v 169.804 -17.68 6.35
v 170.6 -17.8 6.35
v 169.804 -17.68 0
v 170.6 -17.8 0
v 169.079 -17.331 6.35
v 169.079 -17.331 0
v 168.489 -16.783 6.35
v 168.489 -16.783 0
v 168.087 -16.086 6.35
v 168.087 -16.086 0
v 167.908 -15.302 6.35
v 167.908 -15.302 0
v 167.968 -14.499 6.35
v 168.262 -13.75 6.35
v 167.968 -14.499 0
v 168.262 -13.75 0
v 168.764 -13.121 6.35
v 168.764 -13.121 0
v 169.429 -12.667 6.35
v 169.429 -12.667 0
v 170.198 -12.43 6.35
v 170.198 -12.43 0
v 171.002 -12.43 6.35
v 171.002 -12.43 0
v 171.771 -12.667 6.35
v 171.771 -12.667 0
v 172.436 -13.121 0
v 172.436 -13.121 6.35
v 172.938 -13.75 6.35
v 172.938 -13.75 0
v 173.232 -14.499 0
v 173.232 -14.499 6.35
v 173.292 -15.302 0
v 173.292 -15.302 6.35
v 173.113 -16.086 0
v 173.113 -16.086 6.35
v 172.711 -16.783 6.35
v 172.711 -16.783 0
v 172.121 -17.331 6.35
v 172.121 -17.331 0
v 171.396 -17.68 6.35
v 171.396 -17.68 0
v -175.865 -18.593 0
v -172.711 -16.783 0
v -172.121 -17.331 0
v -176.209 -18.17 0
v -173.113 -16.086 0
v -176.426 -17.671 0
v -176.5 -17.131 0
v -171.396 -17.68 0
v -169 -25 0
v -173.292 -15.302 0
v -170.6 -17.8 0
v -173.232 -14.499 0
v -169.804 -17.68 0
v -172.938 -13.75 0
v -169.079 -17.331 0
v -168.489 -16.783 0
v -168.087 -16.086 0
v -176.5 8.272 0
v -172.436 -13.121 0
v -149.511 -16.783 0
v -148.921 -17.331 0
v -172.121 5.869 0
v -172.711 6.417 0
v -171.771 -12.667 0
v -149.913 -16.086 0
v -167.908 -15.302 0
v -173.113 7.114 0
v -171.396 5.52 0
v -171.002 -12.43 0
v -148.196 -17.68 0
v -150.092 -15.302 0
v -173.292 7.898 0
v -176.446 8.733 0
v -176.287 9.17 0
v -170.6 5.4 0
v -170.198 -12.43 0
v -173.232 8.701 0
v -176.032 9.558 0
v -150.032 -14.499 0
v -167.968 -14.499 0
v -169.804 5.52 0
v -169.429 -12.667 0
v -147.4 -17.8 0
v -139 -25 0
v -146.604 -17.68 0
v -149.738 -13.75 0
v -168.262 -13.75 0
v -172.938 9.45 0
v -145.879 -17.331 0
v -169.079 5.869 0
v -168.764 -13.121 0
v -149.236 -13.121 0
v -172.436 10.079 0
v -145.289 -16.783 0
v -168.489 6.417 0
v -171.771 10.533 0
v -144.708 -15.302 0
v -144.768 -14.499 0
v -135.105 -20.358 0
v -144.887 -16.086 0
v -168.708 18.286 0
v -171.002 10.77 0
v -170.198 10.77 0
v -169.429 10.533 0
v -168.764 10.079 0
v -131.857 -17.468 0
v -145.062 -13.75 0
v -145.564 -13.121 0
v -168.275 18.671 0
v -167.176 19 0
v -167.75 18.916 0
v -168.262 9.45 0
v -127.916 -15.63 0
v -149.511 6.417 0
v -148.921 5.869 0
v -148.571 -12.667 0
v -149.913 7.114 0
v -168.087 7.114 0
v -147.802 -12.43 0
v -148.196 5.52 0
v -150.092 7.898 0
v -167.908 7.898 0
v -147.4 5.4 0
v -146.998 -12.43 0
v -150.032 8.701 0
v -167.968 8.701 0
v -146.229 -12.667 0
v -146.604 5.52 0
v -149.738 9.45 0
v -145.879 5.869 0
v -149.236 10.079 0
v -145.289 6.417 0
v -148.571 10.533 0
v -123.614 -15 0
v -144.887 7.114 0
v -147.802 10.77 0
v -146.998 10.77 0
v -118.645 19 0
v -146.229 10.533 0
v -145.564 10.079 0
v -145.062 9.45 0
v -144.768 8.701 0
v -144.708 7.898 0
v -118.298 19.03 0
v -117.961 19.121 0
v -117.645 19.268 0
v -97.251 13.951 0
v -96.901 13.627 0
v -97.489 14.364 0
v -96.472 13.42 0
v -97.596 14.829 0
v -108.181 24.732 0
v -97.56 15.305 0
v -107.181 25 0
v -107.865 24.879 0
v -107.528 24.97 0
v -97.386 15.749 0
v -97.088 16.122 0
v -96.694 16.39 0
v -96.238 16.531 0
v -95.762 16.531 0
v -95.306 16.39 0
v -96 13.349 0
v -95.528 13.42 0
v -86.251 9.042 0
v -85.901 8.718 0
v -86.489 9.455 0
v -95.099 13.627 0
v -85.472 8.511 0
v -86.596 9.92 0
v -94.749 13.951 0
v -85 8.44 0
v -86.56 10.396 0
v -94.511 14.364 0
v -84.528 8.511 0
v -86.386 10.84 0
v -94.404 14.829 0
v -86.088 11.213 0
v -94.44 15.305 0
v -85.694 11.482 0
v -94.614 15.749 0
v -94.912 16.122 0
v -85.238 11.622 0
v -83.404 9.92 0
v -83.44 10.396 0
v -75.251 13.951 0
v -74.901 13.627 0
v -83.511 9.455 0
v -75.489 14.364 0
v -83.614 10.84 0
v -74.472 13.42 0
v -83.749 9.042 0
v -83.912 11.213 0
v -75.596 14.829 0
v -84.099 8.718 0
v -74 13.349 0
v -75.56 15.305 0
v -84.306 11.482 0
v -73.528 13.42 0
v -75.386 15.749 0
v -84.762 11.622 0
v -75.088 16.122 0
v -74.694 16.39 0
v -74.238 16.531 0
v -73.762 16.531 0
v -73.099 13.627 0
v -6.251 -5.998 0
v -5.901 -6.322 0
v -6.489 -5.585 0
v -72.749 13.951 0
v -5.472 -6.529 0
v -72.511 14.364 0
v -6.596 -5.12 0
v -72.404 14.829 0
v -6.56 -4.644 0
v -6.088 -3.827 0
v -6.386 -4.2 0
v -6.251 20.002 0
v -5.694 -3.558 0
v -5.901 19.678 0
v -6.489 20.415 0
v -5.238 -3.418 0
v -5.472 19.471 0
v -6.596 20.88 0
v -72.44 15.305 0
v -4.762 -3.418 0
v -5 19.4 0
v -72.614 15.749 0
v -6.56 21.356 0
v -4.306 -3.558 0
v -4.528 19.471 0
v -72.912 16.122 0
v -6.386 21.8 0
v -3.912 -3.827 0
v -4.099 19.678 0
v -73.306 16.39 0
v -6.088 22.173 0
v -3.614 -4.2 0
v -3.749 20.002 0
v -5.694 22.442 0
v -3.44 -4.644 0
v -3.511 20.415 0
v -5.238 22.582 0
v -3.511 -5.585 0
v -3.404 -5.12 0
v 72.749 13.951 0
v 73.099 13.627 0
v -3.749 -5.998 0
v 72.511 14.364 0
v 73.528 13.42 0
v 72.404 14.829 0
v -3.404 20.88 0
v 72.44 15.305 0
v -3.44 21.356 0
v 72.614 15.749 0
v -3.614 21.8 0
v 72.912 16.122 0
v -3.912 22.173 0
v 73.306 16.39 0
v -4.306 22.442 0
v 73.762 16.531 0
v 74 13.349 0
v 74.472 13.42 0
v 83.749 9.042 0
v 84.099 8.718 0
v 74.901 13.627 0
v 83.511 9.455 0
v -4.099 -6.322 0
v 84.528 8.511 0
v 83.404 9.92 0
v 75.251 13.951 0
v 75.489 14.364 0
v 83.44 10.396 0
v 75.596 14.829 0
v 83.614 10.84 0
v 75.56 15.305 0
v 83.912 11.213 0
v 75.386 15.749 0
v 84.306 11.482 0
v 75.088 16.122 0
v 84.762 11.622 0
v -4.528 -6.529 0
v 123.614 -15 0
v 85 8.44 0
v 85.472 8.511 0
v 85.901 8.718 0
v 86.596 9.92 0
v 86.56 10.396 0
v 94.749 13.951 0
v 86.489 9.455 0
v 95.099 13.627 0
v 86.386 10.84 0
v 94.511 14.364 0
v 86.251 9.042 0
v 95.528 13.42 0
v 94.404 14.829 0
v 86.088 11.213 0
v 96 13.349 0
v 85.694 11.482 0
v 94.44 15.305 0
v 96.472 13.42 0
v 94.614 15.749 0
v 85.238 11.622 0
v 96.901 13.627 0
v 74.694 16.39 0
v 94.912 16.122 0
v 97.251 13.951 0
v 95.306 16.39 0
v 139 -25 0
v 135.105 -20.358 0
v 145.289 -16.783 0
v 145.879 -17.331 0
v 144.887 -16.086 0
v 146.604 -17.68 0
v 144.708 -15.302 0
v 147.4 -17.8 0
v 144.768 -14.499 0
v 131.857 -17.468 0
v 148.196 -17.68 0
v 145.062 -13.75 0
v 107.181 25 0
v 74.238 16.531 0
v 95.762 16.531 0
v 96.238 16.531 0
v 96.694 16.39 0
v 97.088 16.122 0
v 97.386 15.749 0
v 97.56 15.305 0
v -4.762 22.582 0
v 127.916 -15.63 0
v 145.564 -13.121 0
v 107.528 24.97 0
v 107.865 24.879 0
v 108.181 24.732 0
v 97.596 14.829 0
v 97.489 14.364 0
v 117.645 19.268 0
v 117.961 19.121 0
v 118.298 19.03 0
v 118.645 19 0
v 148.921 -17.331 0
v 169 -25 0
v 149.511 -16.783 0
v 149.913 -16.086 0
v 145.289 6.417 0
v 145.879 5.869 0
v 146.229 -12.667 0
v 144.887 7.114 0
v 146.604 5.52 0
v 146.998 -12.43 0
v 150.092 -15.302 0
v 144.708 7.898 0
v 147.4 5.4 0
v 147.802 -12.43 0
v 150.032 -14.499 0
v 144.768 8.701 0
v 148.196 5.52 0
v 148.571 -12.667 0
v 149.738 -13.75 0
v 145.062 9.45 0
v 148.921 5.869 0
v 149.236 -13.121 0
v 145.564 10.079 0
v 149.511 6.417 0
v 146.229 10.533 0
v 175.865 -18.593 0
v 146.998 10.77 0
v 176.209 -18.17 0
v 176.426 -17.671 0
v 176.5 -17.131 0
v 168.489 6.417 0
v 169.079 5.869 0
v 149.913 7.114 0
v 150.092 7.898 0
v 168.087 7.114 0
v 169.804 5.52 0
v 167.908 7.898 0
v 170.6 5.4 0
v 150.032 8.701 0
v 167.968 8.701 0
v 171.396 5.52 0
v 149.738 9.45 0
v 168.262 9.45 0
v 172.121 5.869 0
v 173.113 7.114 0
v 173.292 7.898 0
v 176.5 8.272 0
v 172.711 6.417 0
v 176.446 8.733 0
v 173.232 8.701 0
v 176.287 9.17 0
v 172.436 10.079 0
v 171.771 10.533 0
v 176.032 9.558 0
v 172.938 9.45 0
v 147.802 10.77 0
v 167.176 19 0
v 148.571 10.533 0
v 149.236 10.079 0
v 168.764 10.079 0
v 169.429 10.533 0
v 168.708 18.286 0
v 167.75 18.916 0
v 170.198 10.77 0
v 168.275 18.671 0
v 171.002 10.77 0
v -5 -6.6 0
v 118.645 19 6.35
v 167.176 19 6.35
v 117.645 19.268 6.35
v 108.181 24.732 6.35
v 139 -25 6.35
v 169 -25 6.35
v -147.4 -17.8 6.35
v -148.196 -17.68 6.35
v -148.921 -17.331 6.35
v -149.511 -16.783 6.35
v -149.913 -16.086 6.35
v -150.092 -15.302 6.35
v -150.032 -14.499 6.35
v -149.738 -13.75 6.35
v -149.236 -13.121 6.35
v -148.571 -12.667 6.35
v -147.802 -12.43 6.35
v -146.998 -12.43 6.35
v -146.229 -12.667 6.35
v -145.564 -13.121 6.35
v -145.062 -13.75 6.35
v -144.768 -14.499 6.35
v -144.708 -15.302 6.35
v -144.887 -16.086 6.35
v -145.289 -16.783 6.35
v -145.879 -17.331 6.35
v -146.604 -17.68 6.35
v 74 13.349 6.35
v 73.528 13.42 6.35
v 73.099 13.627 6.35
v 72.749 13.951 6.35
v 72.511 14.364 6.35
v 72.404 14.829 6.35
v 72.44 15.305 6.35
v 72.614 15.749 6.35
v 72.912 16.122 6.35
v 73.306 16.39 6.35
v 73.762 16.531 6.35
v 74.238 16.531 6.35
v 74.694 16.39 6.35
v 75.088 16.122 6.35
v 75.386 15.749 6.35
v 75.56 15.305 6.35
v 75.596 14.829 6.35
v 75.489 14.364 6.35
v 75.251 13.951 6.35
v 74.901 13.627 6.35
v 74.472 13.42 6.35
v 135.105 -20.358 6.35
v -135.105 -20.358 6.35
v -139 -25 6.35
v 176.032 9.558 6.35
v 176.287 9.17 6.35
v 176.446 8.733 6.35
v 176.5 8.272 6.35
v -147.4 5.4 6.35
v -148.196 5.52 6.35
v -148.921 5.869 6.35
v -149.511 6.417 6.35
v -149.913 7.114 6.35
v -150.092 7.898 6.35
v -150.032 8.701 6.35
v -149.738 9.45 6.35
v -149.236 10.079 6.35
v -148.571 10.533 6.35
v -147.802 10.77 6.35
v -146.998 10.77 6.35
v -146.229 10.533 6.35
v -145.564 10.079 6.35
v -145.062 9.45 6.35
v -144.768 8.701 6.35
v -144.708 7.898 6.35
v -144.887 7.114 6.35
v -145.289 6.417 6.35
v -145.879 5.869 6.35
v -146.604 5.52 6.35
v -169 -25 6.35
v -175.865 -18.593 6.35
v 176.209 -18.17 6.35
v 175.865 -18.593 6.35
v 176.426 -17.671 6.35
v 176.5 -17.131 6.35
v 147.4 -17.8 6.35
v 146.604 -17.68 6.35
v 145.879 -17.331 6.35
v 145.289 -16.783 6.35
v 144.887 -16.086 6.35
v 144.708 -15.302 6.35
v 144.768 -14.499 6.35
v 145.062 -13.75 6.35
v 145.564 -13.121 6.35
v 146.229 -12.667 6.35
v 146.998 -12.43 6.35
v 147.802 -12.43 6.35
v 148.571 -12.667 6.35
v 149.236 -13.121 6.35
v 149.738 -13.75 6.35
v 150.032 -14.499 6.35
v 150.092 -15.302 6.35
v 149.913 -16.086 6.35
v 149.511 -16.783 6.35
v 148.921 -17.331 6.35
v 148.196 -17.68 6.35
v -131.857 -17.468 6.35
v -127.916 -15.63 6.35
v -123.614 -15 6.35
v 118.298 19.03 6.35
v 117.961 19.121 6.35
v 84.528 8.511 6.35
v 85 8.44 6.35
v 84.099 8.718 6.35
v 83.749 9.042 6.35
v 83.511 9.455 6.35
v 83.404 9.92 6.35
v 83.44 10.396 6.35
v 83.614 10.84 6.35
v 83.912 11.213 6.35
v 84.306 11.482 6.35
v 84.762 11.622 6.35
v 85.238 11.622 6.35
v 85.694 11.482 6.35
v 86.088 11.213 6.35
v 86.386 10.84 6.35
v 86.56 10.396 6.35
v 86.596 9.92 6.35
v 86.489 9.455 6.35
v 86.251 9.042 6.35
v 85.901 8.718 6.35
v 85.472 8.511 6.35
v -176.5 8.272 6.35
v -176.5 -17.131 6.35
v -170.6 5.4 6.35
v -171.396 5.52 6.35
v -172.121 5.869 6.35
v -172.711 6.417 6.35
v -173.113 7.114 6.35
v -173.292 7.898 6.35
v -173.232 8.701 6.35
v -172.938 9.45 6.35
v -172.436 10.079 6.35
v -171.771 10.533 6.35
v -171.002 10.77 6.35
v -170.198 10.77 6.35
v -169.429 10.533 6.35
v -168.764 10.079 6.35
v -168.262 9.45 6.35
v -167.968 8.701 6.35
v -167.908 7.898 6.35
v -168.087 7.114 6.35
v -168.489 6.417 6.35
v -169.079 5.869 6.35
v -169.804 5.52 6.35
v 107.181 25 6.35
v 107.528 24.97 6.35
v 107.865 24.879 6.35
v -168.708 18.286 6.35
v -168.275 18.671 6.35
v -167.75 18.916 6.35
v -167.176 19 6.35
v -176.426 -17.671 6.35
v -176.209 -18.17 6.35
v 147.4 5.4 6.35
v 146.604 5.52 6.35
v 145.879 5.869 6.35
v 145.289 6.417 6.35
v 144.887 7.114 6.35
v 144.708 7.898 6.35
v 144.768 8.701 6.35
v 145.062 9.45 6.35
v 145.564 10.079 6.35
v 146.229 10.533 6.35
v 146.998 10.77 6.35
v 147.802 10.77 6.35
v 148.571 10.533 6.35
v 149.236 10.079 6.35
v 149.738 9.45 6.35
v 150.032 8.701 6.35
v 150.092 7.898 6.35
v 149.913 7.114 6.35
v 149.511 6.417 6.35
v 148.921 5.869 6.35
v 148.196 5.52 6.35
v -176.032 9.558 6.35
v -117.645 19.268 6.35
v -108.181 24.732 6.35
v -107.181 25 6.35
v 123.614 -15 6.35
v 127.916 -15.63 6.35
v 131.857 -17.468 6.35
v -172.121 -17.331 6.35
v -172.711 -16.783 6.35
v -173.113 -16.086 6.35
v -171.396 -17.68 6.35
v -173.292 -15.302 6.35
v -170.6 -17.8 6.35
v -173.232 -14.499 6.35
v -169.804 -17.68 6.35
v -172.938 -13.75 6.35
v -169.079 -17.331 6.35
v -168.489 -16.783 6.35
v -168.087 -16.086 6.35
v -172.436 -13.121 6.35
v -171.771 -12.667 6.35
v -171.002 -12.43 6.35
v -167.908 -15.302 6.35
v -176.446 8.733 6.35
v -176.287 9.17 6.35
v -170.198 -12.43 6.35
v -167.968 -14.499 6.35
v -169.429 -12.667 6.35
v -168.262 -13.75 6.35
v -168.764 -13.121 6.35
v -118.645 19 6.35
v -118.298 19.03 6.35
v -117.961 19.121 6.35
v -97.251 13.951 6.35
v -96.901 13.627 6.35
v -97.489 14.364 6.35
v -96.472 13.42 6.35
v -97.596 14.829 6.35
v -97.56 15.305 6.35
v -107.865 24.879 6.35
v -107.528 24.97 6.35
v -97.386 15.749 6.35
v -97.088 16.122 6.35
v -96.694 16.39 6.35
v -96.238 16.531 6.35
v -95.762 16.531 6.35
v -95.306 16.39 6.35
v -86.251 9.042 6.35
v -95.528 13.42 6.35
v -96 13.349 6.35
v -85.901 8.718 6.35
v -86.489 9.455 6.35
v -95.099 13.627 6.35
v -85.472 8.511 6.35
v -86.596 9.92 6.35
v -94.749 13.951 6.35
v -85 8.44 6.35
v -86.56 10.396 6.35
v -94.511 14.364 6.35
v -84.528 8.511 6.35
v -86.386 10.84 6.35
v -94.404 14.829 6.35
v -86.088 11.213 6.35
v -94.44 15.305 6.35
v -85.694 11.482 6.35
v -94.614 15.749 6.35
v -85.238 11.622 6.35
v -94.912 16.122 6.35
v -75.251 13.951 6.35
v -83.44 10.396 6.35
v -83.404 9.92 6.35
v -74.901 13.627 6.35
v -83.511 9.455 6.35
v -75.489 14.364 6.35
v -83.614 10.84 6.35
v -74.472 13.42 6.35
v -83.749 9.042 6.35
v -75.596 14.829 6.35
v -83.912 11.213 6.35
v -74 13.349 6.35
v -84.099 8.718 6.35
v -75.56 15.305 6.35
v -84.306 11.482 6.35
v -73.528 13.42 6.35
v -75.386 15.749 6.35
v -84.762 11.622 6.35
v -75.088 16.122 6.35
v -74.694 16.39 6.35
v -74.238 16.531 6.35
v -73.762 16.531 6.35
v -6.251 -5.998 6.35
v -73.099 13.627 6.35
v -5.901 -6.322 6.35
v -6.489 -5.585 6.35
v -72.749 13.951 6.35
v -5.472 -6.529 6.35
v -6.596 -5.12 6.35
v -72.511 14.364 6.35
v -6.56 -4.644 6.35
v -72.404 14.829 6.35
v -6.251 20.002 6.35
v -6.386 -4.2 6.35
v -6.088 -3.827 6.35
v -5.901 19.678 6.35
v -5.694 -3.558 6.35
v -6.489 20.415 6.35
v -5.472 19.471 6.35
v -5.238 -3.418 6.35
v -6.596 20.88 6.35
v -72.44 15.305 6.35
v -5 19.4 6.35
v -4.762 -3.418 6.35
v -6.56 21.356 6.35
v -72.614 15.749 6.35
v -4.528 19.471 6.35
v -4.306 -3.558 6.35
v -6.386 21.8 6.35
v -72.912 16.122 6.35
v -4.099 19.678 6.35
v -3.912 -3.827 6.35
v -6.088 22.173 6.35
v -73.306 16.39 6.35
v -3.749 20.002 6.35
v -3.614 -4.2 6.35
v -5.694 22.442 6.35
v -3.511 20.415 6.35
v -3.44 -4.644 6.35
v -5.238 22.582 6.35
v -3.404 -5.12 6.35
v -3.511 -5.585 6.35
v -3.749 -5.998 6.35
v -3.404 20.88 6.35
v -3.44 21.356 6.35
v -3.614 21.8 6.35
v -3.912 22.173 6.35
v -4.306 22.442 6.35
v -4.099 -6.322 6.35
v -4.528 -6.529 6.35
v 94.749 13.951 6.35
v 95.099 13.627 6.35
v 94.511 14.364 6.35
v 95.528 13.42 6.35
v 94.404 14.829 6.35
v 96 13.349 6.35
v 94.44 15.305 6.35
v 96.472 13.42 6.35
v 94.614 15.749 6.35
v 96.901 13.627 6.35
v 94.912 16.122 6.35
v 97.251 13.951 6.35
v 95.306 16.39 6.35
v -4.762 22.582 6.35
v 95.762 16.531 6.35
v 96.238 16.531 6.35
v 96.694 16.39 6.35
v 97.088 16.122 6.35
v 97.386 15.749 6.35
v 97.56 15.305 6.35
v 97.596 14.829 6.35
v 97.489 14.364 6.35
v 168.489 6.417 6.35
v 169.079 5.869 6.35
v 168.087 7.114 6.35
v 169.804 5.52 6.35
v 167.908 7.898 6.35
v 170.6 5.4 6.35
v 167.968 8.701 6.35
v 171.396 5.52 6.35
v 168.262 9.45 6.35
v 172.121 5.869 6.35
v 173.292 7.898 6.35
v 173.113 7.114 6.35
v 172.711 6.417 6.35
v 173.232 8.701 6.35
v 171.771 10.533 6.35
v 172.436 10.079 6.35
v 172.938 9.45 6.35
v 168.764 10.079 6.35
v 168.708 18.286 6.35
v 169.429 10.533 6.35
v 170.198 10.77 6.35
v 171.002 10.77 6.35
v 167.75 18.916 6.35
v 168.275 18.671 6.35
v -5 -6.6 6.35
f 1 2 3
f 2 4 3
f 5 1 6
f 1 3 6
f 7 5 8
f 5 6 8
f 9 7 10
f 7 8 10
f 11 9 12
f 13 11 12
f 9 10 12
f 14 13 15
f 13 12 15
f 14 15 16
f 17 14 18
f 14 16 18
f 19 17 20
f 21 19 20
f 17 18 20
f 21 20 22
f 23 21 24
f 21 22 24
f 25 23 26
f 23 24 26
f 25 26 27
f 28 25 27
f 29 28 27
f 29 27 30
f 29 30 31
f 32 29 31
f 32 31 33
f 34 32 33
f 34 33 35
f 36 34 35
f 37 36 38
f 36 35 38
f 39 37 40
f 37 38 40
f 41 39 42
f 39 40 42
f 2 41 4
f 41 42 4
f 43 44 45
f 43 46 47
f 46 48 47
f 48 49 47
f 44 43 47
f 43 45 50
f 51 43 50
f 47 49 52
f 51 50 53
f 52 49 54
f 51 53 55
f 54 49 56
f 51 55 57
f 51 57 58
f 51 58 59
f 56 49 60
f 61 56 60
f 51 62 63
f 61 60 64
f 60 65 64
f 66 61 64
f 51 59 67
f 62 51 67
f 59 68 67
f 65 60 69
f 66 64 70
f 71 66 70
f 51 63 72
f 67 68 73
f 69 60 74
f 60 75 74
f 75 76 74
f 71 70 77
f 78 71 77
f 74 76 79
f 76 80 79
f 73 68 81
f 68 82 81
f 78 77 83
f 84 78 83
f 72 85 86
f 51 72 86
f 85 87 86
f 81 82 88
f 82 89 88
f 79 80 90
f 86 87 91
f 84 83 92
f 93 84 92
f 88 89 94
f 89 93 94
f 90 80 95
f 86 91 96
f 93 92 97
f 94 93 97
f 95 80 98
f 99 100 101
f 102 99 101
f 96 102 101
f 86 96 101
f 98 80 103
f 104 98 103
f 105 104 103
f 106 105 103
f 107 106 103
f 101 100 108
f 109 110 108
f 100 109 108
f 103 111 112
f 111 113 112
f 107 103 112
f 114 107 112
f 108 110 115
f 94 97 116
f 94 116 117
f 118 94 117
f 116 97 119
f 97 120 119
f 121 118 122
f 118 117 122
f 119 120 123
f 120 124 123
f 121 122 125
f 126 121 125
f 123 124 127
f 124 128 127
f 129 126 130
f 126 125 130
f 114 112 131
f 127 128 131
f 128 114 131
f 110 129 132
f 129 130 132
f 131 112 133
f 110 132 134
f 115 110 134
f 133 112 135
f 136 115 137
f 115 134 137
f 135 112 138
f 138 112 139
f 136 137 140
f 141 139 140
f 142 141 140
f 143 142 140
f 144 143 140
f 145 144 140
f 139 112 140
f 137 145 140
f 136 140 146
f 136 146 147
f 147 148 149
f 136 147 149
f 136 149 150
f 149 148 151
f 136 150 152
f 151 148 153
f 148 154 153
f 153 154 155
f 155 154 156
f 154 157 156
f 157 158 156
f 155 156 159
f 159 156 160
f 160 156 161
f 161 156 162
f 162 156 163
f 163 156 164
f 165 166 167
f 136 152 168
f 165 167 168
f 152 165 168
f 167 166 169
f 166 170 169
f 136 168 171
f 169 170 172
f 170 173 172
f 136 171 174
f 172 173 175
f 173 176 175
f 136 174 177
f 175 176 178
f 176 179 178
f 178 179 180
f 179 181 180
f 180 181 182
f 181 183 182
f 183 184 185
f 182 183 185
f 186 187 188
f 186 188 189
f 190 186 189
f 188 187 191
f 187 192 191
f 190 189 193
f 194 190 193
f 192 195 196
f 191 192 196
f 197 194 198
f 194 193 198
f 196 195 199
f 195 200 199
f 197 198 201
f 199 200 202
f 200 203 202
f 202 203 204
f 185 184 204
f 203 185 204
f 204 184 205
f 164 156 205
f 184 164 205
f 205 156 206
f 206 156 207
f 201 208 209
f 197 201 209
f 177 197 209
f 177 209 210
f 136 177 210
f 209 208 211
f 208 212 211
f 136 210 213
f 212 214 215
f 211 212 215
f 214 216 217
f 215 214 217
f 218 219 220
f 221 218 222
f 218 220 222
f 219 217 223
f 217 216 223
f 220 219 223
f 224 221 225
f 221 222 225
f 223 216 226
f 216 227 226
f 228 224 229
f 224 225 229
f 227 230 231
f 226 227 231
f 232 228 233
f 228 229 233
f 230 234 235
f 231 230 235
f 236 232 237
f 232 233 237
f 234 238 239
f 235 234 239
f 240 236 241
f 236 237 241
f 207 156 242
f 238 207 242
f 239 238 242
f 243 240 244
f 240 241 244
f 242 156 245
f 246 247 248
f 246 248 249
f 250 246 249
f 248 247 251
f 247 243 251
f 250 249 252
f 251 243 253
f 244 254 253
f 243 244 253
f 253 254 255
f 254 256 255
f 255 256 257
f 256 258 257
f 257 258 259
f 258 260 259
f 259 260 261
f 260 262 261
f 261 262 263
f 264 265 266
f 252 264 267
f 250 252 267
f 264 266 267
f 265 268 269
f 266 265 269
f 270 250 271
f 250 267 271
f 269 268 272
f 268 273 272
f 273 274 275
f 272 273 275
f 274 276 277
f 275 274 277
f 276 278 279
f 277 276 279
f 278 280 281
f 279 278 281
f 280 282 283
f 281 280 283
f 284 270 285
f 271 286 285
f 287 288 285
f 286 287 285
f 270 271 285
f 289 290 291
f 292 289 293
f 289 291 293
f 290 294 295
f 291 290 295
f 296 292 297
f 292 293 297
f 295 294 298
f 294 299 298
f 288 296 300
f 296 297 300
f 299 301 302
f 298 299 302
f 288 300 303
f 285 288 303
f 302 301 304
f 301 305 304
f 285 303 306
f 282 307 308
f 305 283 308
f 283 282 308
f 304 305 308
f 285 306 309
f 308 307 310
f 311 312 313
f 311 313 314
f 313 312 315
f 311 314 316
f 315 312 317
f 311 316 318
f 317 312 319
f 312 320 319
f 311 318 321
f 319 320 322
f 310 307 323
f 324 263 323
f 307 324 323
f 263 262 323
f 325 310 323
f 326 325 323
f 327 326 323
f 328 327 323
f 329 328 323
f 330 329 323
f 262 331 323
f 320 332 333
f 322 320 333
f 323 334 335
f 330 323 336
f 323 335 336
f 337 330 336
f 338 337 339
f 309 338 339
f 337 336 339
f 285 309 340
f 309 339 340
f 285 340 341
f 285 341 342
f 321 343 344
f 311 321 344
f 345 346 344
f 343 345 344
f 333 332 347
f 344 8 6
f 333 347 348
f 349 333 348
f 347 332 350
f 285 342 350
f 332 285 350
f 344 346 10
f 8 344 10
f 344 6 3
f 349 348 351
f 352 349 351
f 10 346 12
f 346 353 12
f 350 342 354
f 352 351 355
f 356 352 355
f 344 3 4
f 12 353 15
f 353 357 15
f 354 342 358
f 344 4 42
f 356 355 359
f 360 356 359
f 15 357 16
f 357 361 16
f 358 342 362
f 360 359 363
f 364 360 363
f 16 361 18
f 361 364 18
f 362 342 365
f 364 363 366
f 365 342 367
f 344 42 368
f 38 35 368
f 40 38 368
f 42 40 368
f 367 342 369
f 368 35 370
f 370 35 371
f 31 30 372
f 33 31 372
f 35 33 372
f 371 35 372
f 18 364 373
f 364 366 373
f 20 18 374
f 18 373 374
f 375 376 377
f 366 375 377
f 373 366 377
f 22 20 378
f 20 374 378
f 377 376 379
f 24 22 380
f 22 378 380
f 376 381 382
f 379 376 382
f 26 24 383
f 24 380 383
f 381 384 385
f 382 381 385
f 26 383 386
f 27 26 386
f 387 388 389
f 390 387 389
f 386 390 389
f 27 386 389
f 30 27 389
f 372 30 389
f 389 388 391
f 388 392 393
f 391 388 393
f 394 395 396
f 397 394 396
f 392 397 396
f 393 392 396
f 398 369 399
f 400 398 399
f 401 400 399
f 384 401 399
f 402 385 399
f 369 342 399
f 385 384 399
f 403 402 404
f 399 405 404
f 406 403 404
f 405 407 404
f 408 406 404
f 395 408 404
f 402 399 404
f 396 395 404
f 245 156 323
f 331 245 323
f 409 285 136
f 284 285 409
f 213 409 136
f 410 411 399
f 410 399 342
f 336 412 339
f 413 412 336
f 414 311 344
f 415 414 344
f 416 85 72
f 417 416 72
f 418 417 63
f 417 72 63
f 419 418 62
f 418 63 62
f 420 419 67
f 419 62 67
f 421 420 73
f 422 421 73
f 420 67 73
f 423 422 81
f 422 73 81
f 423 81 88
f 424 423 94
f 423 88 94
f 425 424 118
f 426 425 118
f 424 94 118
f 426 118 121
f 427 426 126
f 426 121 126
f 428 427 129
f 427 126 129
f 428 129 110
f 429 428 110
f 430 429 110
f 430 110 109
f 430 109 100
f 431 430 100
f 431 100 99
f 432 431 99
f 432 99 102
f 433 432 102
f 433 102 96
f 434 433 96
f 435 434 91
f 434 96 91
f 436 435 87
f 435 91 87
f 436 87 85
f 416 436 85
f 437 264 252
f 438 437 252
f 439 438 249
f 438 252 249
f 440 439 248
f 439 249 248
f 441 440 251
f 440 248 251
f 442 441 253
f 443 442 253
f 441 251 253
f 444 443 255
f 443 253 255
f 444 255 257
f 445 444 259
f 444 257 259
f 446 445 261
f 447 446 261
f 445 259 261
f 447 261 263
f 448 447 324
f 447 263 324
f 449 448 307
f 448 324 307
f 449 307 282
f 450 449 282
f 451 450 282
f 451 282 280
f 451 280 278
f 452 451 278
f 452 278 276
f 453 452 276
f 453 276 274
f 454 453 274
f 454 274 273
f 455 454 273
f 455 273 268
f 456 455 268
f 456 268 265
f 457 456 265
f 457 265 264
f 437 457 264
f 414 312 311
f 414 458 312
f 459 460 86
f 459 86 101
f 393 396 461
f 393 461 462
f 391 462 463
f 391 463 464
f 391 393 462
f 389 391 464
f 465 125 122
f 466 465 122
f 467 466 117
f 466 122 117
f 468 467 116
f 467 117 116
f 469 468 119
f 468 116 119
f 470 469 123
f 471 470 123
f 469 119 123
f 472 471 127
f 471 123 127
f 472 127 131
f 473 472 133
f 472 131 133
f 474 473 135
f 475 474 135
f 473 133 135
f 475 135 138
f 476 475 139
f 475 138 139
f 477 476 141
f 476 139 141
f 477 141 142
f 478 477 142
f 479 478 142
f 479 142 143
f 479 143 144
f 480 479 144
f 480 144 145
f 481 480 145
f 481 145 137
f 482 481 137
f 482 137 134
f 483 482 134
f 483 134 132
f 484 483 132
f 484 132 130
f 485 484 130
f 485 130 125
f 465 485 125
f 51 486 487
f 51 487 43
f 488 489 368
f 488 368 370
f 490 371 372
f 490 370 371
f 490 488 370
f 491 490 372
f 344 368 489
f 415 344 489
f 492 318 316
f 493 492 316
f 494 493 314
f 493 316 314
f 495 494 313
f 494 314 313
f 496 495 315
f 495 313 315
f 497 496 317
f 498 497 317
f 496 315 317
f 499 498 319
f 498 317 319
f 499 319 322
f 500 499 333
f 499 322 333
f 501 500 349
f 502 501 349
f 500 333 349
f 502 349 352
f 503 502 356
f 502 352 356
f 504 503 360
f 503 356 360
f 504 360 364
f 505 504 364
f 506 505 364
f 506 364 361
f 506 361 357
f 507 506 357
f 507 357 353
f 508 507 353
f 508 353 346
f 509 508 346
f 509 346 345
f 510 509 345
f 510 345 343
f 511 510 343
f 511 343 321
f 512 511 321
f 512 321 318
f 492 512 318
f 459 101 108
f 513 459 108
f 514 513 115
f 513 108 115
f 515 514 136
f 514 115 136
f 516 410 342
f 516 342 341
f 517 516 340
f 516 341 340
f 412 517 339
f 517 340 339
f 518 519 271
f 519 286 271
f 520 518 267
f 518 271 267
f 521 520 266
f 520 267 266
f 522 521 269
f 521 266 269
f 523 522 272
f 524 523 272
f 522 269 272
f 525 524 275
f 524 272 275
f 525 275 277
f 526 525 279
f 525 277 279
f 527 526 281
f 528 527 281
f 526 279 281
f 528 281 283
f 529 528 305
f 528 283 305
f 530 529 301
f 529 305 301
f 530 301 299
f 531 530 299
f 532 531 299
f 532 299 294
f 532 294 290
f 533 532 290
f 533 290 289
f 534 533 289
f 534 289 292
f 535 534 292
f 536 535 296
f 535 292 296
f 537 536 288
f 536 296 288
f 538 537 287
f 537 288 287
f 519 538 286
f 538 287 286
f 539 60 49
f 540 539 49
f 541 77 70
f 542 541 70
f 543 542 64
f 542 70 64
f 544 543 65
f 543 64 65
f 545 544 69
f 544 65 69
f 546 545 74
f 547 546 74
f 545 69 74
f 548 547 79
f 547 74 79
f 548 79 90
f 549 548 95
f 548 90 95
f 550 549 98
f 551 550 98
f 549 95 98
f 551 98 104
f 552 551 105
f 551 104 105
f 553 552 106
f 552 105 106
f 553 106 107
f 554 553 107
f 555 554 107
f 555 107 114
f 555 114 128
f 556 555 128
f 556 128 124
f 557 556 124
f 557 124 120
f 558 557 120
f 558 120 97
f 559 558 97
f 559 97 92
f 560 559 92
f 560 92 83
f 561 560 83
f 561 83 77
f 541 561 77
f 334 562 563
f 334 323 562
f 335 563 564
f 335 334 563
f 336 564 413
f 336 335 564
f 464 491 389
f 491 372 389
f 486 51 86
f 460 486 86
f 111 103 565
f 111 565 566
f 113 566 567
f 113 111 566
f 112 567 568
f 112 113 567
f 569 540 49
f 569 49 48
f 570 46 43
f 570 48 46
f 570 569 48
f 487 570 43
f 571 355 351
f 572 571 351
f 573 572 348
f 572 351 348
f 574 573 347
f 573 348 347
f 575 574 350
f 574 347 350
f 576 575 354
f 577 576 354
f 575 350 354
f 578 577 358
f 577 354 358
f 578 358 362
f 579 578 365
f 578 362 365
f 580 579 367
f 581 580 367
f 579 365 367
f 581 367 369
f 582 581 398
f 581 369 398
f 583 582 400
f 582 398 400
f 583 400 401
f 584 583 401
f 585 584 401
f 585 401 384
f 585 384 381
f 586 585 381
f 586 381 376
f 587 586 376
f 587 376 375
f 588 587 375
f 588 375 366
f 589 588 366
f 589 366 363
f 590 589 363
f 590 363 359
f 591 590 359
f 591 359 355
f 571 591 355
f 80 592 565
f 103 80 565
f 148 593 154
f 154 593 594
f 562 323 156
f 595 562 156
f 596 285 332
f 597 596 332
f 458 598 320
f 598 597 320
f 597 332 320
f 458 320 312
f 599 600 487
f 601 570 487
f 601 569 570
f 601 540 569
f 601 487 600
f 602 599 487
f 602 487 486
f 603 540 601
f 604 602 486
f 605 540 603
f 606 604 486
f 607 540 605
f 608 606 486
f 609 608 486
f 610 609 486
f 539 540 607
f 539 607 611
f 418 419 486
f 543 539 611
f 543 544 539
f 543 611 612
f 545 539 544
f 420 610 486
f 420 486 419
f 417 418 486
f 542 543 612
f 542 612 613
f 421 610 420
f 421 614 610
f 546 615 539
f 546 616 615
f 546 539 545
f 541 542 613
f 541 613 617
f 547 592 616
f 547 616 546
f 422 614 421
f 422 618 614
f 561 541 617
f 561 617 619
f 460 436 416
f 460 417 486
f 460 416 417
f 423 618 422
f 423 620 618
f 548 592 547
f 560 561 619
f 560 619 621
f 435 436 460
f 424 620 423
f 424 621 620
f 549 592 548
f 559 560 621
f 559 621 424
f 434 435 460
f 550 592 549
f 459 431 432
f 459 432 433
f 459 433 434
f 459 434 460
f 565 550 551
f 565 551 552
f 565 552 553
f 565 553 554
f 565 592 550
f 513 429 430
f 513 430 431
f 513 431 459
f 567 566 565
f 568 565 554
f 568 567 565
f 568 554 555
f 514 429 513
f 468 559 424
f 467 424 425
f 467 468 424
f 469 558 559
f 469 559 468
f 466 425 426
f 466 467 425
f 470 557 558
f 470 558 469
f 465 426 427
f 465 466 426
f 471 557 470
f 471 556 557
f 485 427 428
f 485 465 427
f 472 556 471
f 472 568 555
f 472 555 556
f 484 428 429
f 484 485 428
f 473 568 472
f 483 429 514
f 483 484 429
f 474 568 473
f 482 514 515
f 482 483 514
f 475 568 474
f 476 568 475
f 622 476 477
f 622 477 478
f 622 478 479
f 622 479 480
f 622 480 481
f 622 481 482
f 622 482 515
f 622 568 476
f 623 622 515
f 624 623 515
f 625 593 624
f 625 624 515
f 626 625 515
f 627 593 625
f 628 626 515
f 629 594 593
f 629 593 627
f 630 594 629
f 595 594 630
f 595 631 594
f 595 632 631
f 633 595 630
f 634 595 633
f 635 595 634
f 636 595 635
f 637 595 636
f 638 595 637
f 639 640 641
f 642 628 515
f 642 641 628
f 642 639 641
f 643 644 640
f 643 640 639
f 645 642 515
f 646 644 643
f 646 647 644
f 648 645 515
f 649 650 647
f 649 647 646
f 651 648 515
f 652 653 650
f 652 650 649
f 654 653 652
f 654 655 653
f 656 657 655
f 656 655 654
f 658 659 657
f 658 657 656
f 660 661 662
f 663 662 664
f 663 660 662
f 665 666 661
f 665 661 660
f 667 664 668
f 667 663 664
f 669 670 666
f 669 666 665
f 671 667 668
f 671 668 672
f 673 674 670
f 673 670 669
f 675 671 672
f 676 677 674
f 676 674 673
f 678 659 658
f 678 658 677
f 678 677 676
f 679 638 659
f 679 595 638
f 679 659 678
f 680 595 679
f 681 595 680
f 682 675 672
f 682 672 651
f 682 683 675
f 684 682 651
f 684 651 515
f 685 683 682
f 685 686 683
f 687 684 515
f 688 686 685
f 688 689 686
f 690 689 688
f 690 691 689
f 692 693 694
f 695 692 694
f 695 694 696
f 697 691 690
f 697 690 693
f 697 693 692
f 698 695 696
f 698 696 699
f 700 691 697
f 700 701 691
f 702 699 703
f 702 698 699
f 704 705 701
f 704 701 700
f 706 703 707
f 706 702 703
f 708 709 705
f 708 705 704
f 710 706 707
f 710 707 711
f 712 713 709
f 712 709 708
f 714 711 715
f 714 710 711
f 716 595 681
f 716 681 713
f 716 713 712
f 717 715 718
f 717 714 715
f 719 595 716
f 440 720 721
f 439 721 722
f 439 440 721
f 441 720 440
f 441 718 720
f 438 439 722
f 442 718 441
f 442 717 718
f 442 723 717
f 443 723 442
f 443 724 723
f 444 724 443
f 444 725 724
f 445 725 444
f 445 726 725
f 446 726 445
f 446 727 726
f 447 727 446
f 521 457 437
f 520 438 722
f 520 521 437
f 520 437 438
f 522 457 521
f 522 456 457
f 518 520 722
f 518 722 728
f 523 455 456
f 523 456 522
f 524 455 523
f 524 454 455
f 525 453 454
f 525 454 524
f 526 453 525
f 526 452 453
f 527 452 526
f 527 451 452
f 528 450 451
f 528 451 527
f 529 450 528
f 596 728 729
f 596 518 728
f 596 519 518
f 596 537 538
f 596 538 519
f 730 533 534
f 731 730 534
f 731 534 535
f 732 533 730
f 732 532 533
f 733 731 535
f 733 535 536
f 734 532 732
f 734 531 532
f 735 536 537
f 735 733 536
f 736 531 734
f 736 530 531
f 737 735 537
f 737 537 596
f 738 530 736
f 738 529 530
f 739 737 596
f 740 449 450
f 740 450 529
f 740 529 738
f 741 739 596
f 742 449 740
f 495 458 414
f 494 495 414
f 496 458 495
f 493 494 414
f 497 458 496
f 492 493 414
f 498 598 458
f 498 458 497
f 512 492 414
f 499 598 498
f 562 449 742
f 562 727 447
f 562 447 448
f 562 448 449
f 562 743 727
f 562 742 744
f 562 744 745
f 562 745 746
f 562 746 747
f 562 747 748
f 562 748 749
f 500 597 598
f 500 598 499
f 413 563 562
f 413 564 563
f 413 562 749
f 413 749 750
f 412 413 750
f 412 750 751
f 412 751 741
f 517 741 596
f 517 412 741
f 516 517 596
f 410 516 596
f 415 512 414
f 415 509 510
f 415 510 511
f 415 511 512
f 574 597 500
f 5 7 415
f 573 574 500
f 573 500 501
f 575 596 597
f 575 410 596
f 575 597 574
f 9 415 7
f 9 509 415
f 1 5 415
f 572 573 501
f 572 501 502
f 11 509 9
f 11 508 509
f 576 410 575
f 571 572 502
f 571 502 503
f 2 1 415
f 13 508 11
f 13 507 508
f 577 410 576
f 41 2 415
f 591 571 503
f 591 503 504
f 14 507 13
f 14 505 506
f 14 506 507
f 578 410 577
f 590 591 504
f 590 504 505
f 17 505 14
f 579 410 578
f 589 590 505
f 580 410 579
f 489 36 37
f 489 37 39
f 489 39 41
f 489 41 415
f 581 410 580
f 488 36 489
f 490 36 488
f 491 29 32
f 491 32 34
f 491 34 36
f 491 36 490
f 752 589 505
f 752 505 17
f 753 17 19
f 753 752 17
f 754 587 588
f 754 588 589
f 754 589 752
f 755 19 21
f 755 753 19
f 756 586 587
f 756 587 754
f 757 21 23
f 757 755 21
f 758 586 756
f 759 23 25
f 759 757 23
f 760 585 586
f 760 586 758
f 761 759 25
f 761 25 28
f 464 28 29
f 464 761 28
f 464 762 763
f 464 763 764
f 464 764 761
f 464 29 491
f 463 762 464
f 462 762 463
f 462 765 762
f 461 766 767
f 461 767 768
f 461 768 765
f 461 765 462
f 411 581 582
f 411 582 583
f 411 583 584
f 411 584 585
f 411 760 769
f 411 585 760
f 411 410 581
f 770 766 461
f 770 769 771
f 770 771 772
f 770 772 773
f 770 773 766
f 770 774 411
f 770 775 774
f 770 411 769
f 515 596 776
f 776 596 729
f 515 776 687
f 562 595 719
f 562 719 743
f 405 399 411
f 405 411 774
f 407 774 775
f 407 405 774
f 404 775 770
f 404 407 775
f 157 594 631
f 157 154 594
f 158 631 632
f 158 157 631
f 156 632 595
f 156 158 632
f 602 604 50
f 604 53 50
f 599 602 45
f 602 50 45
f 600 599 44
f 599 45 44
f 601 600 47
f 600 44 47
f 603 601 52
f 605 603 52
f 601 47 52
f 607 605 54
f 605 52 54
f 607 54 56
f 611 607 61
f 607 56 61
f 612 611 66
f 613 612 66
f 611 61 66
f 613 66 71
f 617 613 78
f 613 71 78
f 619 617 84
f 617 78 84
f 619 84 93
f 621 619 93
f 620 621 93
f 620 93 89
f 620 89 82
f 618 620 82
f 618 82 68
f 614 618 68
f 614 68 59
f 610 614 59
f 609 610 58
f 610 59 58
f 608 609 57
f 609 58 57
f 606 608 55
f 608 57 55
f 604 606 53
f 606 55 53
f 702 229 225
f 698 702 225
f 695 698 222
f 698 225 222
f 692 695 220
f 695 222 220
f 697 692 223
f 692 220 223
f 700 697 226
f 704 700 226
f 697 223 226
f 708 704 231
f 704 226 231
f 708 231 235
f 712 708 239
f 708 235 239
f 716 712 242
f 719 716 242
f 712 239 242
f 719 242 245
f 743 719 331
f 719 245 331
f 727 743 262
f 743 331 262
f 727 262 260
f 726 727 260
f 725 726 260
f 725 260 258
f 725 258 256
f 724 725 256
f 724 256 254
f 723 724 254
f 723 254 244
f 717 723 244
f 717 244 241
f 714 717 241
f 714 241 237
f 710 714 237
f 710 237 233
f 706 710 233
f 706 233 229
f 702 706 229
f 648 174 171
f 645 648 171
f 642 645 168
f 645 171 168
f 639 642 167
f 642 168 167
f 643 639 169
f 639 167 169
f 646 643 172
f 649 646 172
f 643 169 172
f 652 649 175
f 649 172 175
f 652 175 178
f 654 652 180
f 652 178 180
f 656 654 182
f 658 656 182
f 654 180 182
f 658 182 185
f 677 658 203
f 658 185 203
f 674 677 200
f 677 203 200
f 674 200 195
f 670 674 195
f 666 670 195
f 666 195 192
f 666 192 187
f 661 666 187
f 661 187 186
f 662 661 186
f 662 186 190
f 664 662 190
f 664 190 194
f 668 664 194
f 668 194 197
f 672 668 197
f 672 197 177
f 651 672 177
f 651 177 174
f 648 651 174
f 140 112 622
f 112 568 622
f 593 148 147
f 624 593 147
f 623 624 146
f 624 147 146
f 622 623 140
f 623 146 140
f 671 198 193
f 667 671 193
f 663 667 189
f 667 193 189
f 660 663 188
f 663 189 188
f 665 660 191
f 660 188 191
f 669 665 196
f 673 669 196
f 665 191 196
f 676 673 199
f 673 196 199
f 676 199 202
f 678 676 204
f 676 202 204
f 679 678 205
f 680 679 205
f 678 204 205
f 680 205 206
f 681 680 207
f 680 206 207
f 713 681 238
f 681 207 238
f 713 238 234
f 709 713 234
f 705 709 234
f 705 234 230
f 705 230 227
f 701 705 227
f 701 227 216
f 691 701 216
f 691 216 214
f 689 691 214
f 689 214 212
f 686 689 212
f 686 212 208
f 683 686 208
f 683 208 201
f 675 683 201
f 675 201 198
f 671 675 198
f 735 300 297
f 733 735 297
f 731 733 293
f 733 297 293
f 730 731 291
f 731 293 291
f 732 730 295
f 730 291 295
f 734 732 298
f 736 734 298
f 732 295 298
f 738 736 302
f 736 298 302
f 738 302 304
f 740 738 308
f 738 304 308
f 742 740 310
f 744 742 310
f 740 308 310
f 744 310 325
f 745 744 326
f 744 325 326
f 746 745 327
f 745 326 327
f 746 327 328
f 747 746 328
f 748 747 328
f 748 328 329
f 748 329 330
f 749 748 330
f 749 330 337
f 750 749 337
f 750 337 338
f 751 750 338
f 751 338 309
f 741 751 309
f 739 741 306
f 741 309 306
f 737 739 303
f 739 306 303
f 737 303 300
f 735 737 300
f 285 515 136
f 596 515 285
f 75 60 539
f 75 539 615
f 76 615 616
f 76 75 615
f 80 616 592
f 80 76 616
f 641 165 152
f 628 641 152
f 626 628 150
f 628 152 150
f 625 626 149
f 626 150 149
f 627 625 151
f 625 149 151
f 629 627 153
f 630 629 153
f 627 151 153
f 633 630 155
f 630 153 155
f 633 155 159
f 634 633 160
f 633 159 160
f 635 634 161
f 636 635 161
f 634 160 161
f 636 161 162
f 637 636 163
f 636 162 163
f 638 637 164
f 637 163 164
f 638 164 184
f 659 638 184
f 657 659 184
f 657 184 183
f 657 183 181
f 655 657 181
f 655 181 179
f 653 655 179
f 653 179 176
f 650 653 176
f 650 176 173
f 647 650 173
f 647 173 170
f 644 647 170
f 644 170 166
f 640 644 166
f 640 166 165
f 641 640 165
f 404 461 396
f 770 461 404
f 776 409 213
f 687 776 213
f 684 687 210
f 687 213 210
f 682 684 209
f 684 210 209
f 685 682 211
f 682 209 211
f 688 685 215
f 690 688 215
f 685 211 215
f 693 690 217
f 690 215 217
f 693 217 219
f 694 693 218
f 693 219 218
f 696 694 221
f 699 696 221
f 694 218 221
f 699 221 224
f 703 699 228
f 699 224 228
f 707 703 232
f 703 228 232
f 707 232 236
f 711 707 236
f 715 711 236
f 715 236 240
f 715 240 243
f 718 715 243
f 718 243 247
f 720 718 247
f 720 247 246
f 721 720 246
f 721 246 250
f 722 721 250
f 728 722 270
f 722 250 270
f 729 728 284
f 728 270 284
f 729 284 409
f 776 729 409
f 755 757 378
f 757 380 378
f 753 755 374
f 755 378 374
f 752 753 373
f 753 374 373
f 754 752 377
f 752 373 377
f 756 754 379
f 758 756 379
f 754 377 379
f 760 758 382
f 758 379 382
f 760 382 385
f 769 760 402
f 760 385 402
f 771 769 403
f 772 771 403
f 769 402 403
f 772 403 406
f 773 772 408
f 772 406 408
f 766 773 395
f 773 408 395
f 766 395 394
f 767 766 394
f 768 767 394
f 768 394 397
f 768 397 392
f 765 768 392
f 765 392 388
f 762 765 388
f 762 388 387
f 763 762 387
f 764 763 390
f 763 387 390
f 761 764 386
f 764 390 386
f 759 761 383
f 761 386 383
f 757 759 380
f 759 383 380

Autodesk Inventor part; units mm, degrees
ref_plane "YZ Plane" through (0, 0, 0) normal (1, 0, 0) x (0, 1, 0)
ref_plane "XZ Plane" through (0, 0, 0) normal (0, 1, 0) x (-1, 0, 0)
ref_plane "XY Plane" through (0, 0, 0) normal (0, 0, 1) x (1, 0, 0)
sketch "Sketch1" plane through (0, 0, 0) normal (0, 0, 1) x (1, 0, 0)
  line L0 (-176.5, -25) -> (176.5, -25)
  line L1 (176.5, -25) -> (176.5, 25)
  line L2 (176.5, 25) -> (-176.5, 25)
  line L3 (-176.5, 25) -> (-176.5, -25)
  line L4 (-176.5, -25) -> (176.5, 25) construction
  line L5 (176.5, -25) -> (-176.5, 25) construction
  point P0 (0, 0)
  dimension "d0" = 50
  dimension "d1" = 353
extrude "Extrusion1" add sketch "Sketch1" along normal blind 6.35
sketch "Sketch2" plane through (0, 0, 6.35) normal (0, 0, 1) x (1, 0, 0)
  line L0 (-176.5, -25) -> (176.5, -25) projected
  line L1 (-176.5, 25) -> (-176.5, -25) projected
  line L2 (0, 0) -> (0, -33.6266)
  point P0 (-147.4, -15.1)
  point P1 (147.4, -15.1)
  point P2 (-170.6, -15.1)
  point P3 (-147.4, 8.1)
  point P4 (-170.6, 8.1)
  point P5 (170.6, -15.1)
  point P6 (147.4, 8.1)
  point P7 (170.6, 8.1)
  dimension "d4" = 294.8
  dimension "d5" = 147.4
  dimension "d6" = 9.9
  dimension "d9" = 23.2
  dimension "d12" = 23.2
hole "Hole1" at (-147.4, -15.1, 6.35) at (147.4, -15.1, 6.35) at (-170.6, -15.1, 6.35) at (-147.4, 8.1, 6.35) at (-170.6, 8.1, 6.35) at (170.6, -15.1, 6.35) at (170.6, 8.1, 6.35) at (147.4, 8.1, 6.35) direction (0, 0, -1) diameter 5.4 end through all
chamfer "Chamfer1" distance 7 distance2 7.5 1 edges at (-176.5, -25, 3.175) measured on face at (-176.5, 8.3333, 2.1167)
chamfer "Chamfer2" distance 7 distance2 7.5 1 edges at (176.5, -25, 3.175) measured on face at (176.5, -8.3333, 4.2333)
sketch "Sketch3" plane through (0, 0, 6.35) normal (0, 0, 1) x (1, 0, 0)
  point P0 (0, 0)
sketch "Sketch4" plane through (0, 0, 6.35) normal (0, 0, 1) x (1, 0, 0)
  circle A0 centre (96, 14.9487) radius 1.6 projected
  circle A1 centre (85, 10.04) radius 1.6 projected
  circle A2 centre (74, 14.9487) radius 1.6 projected
  circle A3 centre (-74, 14.9487) radius 1.6 projected
  circle A4 centre (-85, 10.04) radius 1.6 projected
  circle A5 centre (-96, 14.9487) radius 1.6 projected
  point P0 (0, 0)
hole "Hole2" at (-96, 14.9487, 6.35) at (-85, 10.04, 6.35) at (-74, 14.9487, 6.35) at (74, 14.9487, 6.35) at (85, 10.04, 6.35) at (96, 14.9487, 6.35) direction (0, 0, -1) diameter 3.2 end through all
sketch "Sketch5" plane through (0, 0, 6.35) normal (0, 0, 1) x (1, 0, 0)
  circle A0 centre (-5, 21) radius 2.75 projected
  circle A1 centre (-5, -5) radius 2.75 projected
  point P0 (0, 0)
hole "Hole3" at (-5, 21, 6.35) at (-5, -5, 6.35) direction (0, 0, -1) diameter 3.2 end through all
sketch "Sketch6" plane through (0, 0, 6.35) normal (0, 0, 1) x (1, 0, 0)
  line L0 (-176.5, 9) -> (-168.109, 19)
  line L1 (-168.109, 19) -> (-118.109, 19)
  line L2 (-118.109, 19) -> (-107.7167, 25)
  line L3 (176.5, 25) -> (-176.5, 25) projected
  line L4 (-169, -25) -> (169, -25) projected
  line L5 (-139, -25) -> (-130.609, -15)
  line L6 (-130.609, -15) -> (130.609, -15)
  line L7 (130.609, -15) -> (139, -25)
  line L8 (0, 25) -> (0, 0) construction
  line L9 (-176.5, 25) -> (-176.5, -18) projected
  line L10 (176.5, 9) -> (168.109, 19)
  line L11 (168.109, 19) -> (118.109, 19)
  line L12 (118.109, 19) -> (107.7167, 25)
  line L13 (176.5, -18) -> (176.5, 25) projected
  dimension "d42" = 30
  dimension "d43" = 50
  dimension "d44" = 50
  dimension "d45" = 10
  dimension "d46" = 40
  dimension "d47" = 16
  dimension "d48" = 50
  dimension "d49" = 6
  dimension "d52" = 30
  dimension "d53" = 30
extrude "Extrusion2" cut sketch "Sketch6" against normal blind 10
fillet "Fillet1" radius 15 2 edges at (-130.609, -15, 3.175) (130.609, -15, 3.175)
fillet "Fillet1" radius 2 10 edges at (176.5, -18, 3.175) (176.5, 9, 3.175) (168.109, 19, 3.175) (118.109, 19, 3.175) (107.7167, 25, 3.175) (-118.109, 19, 3.175) (-107.7167, 25, 3.175) (-168.109, 19, 3.175) (-176.5, 9, 3.175) (-176.5, -18, 3.175)
properties part number "FRONT PLATE P1.2"
